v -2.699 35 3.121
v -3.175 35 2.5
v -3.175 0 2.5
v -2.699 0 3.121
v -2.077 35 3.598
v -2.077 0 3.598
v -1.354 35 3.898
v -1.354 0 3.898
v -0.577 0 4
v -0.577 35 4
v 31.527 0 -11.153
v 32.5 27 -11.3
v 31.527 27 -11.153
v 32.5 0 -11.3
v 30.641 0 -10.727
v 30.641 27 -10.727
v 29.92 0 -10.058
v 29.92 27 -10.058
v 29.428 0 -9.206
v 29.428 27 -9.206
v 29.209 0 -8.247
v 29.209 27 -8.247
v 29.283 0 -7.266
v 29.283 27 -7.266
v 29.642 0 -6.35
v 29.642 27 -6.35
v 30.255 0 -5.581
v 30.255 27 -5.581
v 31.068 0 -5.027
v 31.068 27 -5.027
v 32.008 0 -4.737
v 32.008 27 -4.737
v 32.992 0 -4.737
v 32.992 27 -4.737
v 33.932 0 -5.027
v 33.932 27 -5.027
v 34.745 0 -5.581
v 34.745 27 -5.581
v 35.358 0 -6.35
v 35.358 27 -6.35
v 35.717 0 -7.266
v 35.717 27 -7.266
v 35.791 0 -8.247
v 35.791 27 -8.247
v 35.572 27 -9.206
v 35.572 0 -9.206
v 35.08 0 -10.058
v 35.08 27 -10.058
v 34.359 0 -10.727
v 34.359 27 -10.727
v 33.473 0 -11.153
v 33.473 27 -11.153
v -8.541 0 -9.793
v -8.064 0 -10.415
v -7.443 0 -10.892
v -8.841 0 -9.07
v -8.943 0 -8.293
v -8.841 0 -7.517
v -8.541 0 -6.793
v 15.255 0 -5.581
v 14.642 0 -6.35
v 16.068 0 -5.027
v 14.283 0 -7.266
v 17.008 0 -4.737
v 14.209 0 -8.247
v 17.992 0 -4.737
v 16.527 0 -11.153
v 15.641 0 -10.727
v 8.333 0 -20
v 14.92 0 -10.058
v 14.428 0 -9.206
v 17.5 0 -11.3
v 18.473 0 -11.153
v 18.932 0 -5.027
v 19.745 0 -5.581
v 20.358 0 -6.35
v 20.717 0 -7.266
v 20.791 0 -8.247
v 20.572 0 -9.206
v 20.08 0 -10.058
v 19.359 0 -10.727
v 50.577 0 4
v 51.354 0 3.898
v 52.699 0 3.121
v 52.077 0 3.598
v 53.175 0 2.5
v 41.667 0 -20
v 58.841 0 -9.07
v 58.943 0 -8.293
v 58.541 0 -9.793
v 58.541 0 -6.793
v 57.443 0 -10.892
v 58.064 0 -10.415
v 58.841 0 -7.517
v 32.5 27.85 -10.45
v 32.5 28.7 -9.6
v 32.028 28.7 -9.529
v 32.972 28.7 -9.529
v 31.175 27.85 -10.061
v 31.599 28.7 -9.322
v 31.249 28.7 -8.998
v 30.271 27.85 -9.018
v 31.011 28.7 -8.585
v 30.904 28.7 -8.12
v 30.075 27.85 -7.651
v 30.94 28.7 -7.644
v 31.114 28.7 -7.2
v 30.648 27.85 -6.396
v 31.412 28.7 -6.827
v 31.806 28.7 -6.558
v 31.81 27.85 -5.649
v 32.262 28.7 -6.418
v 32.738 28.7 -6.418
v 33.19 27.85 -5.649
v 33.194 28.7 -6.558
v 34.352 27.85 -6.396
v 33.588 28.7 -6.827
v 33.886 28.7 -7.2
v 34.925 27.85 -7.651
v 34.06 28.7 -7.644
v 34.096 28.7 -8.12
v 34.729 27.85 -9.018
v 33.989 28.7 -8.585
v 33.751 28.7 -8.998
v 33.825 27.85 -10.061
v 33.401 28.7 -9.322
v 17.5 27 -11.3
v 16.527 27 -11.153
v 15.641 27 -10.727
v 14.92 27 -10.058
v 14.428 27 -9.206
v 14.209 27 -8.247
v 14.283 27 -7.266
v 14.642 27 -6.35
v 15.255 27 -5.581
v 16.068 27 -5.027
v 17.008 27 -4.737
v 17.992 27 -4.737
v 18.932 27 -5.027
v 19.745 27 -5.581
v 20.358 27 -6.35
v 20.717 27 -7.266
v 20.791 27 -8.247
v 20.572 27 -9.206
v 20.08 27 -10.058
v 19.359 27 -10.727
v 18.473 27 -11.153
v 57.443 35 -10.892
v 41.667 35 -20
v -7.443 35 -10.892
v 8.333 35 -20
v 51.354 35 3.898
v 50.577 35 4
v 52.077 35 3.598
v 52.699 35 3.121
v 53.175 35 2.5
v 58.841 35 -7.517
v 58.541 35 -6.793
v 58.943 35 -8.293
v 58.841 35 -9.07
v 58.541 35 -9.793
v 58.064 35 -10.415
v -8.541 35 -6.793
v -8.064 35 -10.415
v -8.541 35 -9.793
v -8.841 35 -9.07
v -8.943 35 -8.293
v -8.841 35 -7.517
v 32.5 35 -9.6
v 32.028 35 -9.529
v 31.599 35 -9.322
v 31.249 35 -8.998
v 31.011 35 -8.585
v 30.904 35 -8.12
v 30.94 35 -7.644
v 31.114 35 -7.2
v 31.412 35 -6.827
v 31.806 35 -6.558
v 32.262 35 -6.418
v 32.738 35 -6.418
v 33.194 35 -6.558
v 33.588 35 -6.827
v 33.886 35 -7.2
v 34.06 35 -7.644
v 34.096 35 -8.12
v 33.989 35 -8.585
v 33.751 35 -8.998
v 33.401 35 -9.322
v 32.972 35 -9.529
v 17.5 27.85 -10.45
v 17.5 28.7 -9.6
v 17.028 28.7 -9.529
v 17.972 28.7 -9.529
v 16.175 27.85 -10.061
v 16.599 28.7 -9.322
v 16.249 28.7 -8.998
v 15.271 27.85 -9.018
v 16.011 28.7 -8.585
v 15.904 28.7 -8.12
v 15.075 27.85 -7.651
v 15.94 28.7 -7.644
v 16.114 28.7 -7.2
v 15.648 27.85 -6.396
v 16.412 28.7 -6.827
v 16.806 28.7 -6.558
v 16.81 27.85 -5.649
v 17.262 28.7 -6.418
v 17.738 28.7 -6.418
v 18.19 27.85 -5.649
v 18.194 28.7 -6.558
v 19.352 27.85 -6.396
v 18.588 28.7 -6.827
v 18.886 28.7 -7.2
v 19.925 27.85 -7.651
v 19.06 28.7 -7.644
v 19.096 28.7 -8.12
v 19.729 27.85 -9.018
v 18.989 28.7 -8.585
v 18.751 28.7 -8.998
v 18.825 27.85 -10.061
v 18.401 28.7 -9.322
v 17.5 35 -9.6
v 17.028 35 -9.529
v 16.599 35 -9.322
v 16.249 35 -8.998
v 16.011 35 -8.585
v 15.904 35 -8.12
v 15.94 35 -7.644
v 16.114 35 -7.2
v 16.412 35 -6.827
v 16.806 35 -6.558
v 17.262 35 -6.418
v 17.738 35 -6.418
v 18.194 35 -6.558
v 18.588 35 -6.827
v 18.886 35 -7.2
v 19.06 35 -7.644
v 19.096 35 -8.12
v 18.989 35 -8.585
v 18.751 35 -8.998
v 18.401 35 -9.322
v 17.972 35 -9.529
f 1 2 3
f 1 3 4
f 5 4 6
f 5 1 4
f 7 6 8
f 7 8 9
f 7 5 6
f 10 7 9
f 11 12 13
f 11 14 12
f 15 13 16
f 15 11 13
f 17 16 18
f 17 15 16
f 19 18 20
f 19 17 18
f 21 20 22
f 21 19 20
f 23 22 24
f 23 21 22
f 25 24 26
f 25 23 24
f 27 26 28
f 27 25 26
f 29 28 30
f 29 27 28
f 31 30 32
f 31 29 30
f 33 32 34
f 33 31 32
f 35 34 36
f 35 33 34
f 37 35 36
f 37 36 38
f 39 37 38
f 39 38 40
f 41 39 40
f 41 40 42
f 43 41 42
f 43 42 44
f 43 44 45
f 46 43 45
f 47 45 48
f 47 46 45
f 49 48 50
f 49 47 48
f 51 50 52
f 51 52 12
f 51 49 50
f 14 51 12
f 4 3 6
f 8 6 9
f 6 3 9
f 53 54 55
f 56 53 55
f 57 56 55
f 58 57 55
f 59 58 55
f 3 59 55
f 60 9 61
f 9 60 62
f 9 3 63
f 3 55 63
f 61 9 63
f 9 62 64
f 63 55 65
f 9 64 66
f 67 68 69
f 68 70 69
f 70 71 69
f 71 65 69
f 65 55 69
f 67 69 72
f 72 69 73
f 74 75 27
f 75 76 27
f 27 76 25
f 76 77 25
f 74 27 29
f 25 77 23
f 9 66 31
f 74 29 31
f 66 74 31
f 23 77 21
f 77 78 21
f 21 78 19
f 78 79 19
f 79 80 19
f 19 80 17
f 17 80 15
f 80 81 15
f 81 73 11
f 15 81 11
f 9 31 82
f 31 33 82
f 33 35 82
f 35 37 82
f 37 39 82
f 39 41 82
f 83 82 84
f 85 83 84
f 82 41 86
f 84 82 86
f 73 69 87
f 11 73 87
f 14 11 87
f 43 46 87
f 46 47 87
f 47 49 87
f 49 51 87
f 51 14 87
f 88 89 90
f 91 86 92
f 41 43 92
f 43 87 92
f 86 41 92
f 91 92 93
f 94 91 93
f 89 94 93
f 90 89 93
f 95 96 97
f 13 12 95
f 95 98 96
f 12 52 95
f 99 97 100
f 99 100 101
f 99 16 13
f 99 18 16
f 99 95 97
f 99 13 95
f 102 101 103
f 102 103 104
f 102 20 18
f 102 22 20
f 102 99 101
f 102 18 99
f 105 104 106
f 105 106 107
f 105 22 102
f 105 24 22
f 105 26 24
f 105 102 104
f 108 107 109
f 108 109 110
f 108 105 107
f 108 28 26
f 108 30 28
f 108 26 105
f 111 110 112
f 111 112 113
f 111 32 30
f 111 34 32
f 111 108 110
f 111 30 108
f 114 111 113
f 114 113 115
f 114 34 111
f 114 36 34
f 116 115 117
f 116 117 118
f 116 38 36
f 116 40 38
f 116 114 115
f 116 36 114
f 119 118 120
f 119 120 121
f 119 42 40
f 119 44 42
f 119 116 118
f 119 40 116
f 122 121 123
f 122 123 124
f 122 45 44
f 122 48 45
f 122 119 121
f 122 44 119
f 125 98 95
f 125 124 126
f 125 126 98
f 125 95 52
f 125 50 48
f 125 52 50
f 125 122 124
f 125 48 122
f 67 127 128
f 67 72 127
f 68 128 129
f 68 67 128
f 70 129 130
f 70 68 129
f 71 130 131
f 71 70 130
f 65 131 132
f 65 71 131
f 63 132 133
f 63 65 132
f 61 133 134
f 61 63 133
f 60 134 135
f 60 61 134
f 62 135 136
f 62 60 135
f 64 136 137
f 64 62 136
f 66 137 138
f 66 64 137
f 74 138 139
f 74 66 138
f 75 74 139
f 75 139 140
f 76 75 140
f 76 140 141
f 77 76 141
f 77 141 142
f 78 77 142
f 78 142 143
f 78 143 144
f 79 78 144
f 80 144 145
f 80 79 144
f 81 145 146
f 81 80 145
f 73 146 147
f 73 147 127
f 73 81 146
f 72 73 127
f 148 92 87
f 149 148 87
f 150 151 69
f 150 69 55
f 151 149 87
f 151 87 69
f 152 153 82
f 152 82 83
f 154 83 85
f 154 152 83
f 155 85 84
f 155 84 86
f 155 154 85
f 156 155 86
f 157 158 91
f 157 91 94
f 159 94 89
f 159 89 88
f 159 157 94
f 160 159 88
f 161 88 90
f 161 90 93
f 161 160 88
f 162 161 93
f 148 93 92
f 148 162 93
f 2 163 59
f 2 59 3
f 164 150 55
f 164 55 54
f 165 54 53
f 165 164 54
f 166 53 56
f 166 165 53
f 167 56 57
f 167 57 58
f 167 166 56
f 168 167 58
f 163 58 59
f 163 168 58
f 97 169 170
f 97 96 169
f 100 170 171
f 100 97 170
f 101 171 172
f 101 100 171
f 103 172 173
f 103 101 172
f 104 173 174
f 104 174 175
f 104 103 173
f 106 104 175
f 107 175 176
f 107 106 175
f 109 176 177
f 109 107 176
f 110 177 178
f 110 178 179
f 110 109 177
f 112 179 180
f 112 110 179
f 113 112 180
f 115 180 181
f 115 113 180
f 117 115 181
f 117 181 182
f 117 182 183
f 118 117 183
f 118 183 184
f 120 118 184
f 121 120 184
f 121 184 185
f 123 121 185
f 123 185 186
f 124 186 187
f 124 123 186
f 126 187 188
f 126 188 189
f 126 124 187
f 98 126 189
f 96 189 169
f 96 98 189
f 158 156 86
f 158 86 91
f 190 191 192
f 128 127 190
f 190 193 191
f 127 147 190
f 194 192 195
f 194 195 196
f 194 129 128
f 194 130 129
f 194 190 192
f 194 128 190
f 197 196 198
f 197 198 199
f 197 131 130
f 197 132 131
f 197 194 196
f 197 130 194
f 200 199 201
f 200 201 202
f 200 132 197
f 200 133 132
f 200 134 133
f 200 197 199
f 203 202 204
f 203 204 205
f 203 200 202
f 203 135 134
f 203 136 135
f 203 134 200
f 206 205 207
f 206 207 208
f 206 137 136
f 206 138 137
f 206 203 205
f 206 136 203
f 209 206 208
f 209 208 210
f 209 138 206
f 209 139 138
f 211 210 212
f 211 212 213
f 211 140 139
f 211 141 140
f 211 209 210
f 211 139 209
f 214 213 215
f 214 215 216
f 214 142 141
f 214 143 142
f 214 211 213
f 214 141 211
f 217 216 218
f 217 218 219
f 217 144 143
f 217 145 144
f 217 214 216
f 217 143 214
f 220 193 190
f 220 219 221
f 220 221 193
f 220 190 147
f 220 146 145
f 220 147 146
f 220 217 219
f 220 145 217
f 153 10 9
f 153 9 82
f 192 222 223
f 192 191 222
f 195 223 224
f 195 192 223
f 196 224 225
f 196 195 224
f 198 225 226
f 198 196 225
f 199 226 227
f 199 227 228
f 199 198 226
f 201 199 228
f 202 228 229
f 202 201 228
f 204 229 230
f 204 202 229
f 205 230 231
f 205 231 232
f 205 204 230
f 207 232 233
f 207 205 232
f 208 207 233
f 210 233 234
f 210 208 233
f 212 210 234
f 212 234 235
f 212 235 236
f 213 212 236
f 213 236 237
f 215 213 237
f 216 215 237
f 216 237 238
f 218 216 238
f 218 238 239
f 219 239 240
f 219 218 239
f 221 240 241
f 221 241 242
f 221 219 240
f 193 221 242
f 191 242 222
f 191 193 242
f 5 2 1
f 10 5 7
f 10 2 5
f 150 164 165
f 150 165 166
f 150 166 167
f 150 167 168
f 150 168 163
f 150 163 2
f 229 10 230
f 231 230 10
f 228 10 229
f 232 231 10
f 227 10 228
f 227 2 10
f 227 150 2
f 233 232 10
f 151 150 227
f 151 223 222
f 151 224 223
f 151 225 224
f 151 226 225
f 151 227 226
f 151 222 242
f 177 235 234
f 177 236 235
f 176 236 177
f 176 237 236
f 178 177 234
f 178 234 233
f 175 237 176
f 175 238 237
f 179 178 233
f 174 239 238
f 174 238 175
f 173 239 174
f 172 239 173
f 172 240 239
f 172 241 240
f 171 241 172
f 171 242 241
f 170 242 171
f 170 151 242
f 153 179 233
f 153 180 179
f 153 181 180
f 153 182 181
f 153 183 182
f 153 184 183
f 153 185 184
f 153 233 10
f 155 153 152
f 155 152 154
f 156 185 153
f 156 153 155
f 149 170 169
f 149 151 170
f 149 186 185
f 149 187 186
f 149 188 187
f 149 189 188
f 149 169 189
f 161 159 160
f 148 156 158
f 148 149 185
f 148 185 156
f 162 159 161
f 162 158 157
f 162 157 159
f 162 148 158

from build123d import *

# Parameters (mm, degrees)
EXTRUDE_1_DEPTH             = 35
HOLE_WIZARD_M3_1_AT_2_COUNT = 2
HOLE_WIZARD_M3_1_AT_2_PITCH = 15


with BuildPart() as part:
    # 草圖1 → 填料-伸長1 (new body)
    with BuildSketch(Plane(origin=(0, 35, 0), x_dir=(1, 0, 0), z_dir=(0, 1, 0))):
        with BuildLine():
            Line((8.333333333, 20), (-7.442946108, 10.891560818))
            ThreePointArc((-7.442946108, 10.891560818), (-8.840723587, 9.069941742), (-8.54102232, 6.793484606))
            Line((-8.54102232, 6.793484606), (-3.175426481, -2.5))
            ThreePointArc((-3.175426481, -2.5), (-2.077350269, -3.598076211), (-0.577350269, -4))
            Line((-0.577350269, -4), (50.577350269, -4))
            ThreePointArc((50.577350269, -4), (52.077350269, -3.598076211), (53.175426481, -2.5))
            Line((53.175426481, -2.5), (58.54102232, 6.793484606))
            ThreePointArc((58.54102232, 6.793484606), (58.840723587, 9.069941742), (57.442946108, 10.891560818))
            Line((57.442946108, 10.891560818), (41.666666667, 20))
            Line((41.666666667, 20), (8.333333333, 20))
        make_face()
    extrude(amount=-EXTRUDE_1_DEPTH)

    # 草圖2 → M3 平頭機械螺釘的錐孔1 (revolve, cut)
    with BuildSketch(Plane(origin=(17.5, 0, -8), x_dir=(0, 0, -1), z_dir=(1, 0, 0))):
        Polygon((0, 0), (0, 35), (1.6, 35), (1.6, 28.7), (3.3, 27), (3.3, 0), align=None)
    hole_wizard_m3_1 = revolve(axis=Axis((17.5, -6.35, -8), (0, 1, 0)), mode=Mode.SUBTRACT)

    # M3 平頭機械螺釘的錐孔1 at 2: M3 平頭機械螺釘的錐孔1 ×2
    with Locations(*[(i * HOLE_WIZARD_M3_1_AT_2_PITCH, 0, 0) for i in range(1, HOLE_WIZARD_M3_1_AT_2_COUNT)]):
        add(hole_wizard_m3_1, mode=Mode.SUBTRACT)


solid = part.part
